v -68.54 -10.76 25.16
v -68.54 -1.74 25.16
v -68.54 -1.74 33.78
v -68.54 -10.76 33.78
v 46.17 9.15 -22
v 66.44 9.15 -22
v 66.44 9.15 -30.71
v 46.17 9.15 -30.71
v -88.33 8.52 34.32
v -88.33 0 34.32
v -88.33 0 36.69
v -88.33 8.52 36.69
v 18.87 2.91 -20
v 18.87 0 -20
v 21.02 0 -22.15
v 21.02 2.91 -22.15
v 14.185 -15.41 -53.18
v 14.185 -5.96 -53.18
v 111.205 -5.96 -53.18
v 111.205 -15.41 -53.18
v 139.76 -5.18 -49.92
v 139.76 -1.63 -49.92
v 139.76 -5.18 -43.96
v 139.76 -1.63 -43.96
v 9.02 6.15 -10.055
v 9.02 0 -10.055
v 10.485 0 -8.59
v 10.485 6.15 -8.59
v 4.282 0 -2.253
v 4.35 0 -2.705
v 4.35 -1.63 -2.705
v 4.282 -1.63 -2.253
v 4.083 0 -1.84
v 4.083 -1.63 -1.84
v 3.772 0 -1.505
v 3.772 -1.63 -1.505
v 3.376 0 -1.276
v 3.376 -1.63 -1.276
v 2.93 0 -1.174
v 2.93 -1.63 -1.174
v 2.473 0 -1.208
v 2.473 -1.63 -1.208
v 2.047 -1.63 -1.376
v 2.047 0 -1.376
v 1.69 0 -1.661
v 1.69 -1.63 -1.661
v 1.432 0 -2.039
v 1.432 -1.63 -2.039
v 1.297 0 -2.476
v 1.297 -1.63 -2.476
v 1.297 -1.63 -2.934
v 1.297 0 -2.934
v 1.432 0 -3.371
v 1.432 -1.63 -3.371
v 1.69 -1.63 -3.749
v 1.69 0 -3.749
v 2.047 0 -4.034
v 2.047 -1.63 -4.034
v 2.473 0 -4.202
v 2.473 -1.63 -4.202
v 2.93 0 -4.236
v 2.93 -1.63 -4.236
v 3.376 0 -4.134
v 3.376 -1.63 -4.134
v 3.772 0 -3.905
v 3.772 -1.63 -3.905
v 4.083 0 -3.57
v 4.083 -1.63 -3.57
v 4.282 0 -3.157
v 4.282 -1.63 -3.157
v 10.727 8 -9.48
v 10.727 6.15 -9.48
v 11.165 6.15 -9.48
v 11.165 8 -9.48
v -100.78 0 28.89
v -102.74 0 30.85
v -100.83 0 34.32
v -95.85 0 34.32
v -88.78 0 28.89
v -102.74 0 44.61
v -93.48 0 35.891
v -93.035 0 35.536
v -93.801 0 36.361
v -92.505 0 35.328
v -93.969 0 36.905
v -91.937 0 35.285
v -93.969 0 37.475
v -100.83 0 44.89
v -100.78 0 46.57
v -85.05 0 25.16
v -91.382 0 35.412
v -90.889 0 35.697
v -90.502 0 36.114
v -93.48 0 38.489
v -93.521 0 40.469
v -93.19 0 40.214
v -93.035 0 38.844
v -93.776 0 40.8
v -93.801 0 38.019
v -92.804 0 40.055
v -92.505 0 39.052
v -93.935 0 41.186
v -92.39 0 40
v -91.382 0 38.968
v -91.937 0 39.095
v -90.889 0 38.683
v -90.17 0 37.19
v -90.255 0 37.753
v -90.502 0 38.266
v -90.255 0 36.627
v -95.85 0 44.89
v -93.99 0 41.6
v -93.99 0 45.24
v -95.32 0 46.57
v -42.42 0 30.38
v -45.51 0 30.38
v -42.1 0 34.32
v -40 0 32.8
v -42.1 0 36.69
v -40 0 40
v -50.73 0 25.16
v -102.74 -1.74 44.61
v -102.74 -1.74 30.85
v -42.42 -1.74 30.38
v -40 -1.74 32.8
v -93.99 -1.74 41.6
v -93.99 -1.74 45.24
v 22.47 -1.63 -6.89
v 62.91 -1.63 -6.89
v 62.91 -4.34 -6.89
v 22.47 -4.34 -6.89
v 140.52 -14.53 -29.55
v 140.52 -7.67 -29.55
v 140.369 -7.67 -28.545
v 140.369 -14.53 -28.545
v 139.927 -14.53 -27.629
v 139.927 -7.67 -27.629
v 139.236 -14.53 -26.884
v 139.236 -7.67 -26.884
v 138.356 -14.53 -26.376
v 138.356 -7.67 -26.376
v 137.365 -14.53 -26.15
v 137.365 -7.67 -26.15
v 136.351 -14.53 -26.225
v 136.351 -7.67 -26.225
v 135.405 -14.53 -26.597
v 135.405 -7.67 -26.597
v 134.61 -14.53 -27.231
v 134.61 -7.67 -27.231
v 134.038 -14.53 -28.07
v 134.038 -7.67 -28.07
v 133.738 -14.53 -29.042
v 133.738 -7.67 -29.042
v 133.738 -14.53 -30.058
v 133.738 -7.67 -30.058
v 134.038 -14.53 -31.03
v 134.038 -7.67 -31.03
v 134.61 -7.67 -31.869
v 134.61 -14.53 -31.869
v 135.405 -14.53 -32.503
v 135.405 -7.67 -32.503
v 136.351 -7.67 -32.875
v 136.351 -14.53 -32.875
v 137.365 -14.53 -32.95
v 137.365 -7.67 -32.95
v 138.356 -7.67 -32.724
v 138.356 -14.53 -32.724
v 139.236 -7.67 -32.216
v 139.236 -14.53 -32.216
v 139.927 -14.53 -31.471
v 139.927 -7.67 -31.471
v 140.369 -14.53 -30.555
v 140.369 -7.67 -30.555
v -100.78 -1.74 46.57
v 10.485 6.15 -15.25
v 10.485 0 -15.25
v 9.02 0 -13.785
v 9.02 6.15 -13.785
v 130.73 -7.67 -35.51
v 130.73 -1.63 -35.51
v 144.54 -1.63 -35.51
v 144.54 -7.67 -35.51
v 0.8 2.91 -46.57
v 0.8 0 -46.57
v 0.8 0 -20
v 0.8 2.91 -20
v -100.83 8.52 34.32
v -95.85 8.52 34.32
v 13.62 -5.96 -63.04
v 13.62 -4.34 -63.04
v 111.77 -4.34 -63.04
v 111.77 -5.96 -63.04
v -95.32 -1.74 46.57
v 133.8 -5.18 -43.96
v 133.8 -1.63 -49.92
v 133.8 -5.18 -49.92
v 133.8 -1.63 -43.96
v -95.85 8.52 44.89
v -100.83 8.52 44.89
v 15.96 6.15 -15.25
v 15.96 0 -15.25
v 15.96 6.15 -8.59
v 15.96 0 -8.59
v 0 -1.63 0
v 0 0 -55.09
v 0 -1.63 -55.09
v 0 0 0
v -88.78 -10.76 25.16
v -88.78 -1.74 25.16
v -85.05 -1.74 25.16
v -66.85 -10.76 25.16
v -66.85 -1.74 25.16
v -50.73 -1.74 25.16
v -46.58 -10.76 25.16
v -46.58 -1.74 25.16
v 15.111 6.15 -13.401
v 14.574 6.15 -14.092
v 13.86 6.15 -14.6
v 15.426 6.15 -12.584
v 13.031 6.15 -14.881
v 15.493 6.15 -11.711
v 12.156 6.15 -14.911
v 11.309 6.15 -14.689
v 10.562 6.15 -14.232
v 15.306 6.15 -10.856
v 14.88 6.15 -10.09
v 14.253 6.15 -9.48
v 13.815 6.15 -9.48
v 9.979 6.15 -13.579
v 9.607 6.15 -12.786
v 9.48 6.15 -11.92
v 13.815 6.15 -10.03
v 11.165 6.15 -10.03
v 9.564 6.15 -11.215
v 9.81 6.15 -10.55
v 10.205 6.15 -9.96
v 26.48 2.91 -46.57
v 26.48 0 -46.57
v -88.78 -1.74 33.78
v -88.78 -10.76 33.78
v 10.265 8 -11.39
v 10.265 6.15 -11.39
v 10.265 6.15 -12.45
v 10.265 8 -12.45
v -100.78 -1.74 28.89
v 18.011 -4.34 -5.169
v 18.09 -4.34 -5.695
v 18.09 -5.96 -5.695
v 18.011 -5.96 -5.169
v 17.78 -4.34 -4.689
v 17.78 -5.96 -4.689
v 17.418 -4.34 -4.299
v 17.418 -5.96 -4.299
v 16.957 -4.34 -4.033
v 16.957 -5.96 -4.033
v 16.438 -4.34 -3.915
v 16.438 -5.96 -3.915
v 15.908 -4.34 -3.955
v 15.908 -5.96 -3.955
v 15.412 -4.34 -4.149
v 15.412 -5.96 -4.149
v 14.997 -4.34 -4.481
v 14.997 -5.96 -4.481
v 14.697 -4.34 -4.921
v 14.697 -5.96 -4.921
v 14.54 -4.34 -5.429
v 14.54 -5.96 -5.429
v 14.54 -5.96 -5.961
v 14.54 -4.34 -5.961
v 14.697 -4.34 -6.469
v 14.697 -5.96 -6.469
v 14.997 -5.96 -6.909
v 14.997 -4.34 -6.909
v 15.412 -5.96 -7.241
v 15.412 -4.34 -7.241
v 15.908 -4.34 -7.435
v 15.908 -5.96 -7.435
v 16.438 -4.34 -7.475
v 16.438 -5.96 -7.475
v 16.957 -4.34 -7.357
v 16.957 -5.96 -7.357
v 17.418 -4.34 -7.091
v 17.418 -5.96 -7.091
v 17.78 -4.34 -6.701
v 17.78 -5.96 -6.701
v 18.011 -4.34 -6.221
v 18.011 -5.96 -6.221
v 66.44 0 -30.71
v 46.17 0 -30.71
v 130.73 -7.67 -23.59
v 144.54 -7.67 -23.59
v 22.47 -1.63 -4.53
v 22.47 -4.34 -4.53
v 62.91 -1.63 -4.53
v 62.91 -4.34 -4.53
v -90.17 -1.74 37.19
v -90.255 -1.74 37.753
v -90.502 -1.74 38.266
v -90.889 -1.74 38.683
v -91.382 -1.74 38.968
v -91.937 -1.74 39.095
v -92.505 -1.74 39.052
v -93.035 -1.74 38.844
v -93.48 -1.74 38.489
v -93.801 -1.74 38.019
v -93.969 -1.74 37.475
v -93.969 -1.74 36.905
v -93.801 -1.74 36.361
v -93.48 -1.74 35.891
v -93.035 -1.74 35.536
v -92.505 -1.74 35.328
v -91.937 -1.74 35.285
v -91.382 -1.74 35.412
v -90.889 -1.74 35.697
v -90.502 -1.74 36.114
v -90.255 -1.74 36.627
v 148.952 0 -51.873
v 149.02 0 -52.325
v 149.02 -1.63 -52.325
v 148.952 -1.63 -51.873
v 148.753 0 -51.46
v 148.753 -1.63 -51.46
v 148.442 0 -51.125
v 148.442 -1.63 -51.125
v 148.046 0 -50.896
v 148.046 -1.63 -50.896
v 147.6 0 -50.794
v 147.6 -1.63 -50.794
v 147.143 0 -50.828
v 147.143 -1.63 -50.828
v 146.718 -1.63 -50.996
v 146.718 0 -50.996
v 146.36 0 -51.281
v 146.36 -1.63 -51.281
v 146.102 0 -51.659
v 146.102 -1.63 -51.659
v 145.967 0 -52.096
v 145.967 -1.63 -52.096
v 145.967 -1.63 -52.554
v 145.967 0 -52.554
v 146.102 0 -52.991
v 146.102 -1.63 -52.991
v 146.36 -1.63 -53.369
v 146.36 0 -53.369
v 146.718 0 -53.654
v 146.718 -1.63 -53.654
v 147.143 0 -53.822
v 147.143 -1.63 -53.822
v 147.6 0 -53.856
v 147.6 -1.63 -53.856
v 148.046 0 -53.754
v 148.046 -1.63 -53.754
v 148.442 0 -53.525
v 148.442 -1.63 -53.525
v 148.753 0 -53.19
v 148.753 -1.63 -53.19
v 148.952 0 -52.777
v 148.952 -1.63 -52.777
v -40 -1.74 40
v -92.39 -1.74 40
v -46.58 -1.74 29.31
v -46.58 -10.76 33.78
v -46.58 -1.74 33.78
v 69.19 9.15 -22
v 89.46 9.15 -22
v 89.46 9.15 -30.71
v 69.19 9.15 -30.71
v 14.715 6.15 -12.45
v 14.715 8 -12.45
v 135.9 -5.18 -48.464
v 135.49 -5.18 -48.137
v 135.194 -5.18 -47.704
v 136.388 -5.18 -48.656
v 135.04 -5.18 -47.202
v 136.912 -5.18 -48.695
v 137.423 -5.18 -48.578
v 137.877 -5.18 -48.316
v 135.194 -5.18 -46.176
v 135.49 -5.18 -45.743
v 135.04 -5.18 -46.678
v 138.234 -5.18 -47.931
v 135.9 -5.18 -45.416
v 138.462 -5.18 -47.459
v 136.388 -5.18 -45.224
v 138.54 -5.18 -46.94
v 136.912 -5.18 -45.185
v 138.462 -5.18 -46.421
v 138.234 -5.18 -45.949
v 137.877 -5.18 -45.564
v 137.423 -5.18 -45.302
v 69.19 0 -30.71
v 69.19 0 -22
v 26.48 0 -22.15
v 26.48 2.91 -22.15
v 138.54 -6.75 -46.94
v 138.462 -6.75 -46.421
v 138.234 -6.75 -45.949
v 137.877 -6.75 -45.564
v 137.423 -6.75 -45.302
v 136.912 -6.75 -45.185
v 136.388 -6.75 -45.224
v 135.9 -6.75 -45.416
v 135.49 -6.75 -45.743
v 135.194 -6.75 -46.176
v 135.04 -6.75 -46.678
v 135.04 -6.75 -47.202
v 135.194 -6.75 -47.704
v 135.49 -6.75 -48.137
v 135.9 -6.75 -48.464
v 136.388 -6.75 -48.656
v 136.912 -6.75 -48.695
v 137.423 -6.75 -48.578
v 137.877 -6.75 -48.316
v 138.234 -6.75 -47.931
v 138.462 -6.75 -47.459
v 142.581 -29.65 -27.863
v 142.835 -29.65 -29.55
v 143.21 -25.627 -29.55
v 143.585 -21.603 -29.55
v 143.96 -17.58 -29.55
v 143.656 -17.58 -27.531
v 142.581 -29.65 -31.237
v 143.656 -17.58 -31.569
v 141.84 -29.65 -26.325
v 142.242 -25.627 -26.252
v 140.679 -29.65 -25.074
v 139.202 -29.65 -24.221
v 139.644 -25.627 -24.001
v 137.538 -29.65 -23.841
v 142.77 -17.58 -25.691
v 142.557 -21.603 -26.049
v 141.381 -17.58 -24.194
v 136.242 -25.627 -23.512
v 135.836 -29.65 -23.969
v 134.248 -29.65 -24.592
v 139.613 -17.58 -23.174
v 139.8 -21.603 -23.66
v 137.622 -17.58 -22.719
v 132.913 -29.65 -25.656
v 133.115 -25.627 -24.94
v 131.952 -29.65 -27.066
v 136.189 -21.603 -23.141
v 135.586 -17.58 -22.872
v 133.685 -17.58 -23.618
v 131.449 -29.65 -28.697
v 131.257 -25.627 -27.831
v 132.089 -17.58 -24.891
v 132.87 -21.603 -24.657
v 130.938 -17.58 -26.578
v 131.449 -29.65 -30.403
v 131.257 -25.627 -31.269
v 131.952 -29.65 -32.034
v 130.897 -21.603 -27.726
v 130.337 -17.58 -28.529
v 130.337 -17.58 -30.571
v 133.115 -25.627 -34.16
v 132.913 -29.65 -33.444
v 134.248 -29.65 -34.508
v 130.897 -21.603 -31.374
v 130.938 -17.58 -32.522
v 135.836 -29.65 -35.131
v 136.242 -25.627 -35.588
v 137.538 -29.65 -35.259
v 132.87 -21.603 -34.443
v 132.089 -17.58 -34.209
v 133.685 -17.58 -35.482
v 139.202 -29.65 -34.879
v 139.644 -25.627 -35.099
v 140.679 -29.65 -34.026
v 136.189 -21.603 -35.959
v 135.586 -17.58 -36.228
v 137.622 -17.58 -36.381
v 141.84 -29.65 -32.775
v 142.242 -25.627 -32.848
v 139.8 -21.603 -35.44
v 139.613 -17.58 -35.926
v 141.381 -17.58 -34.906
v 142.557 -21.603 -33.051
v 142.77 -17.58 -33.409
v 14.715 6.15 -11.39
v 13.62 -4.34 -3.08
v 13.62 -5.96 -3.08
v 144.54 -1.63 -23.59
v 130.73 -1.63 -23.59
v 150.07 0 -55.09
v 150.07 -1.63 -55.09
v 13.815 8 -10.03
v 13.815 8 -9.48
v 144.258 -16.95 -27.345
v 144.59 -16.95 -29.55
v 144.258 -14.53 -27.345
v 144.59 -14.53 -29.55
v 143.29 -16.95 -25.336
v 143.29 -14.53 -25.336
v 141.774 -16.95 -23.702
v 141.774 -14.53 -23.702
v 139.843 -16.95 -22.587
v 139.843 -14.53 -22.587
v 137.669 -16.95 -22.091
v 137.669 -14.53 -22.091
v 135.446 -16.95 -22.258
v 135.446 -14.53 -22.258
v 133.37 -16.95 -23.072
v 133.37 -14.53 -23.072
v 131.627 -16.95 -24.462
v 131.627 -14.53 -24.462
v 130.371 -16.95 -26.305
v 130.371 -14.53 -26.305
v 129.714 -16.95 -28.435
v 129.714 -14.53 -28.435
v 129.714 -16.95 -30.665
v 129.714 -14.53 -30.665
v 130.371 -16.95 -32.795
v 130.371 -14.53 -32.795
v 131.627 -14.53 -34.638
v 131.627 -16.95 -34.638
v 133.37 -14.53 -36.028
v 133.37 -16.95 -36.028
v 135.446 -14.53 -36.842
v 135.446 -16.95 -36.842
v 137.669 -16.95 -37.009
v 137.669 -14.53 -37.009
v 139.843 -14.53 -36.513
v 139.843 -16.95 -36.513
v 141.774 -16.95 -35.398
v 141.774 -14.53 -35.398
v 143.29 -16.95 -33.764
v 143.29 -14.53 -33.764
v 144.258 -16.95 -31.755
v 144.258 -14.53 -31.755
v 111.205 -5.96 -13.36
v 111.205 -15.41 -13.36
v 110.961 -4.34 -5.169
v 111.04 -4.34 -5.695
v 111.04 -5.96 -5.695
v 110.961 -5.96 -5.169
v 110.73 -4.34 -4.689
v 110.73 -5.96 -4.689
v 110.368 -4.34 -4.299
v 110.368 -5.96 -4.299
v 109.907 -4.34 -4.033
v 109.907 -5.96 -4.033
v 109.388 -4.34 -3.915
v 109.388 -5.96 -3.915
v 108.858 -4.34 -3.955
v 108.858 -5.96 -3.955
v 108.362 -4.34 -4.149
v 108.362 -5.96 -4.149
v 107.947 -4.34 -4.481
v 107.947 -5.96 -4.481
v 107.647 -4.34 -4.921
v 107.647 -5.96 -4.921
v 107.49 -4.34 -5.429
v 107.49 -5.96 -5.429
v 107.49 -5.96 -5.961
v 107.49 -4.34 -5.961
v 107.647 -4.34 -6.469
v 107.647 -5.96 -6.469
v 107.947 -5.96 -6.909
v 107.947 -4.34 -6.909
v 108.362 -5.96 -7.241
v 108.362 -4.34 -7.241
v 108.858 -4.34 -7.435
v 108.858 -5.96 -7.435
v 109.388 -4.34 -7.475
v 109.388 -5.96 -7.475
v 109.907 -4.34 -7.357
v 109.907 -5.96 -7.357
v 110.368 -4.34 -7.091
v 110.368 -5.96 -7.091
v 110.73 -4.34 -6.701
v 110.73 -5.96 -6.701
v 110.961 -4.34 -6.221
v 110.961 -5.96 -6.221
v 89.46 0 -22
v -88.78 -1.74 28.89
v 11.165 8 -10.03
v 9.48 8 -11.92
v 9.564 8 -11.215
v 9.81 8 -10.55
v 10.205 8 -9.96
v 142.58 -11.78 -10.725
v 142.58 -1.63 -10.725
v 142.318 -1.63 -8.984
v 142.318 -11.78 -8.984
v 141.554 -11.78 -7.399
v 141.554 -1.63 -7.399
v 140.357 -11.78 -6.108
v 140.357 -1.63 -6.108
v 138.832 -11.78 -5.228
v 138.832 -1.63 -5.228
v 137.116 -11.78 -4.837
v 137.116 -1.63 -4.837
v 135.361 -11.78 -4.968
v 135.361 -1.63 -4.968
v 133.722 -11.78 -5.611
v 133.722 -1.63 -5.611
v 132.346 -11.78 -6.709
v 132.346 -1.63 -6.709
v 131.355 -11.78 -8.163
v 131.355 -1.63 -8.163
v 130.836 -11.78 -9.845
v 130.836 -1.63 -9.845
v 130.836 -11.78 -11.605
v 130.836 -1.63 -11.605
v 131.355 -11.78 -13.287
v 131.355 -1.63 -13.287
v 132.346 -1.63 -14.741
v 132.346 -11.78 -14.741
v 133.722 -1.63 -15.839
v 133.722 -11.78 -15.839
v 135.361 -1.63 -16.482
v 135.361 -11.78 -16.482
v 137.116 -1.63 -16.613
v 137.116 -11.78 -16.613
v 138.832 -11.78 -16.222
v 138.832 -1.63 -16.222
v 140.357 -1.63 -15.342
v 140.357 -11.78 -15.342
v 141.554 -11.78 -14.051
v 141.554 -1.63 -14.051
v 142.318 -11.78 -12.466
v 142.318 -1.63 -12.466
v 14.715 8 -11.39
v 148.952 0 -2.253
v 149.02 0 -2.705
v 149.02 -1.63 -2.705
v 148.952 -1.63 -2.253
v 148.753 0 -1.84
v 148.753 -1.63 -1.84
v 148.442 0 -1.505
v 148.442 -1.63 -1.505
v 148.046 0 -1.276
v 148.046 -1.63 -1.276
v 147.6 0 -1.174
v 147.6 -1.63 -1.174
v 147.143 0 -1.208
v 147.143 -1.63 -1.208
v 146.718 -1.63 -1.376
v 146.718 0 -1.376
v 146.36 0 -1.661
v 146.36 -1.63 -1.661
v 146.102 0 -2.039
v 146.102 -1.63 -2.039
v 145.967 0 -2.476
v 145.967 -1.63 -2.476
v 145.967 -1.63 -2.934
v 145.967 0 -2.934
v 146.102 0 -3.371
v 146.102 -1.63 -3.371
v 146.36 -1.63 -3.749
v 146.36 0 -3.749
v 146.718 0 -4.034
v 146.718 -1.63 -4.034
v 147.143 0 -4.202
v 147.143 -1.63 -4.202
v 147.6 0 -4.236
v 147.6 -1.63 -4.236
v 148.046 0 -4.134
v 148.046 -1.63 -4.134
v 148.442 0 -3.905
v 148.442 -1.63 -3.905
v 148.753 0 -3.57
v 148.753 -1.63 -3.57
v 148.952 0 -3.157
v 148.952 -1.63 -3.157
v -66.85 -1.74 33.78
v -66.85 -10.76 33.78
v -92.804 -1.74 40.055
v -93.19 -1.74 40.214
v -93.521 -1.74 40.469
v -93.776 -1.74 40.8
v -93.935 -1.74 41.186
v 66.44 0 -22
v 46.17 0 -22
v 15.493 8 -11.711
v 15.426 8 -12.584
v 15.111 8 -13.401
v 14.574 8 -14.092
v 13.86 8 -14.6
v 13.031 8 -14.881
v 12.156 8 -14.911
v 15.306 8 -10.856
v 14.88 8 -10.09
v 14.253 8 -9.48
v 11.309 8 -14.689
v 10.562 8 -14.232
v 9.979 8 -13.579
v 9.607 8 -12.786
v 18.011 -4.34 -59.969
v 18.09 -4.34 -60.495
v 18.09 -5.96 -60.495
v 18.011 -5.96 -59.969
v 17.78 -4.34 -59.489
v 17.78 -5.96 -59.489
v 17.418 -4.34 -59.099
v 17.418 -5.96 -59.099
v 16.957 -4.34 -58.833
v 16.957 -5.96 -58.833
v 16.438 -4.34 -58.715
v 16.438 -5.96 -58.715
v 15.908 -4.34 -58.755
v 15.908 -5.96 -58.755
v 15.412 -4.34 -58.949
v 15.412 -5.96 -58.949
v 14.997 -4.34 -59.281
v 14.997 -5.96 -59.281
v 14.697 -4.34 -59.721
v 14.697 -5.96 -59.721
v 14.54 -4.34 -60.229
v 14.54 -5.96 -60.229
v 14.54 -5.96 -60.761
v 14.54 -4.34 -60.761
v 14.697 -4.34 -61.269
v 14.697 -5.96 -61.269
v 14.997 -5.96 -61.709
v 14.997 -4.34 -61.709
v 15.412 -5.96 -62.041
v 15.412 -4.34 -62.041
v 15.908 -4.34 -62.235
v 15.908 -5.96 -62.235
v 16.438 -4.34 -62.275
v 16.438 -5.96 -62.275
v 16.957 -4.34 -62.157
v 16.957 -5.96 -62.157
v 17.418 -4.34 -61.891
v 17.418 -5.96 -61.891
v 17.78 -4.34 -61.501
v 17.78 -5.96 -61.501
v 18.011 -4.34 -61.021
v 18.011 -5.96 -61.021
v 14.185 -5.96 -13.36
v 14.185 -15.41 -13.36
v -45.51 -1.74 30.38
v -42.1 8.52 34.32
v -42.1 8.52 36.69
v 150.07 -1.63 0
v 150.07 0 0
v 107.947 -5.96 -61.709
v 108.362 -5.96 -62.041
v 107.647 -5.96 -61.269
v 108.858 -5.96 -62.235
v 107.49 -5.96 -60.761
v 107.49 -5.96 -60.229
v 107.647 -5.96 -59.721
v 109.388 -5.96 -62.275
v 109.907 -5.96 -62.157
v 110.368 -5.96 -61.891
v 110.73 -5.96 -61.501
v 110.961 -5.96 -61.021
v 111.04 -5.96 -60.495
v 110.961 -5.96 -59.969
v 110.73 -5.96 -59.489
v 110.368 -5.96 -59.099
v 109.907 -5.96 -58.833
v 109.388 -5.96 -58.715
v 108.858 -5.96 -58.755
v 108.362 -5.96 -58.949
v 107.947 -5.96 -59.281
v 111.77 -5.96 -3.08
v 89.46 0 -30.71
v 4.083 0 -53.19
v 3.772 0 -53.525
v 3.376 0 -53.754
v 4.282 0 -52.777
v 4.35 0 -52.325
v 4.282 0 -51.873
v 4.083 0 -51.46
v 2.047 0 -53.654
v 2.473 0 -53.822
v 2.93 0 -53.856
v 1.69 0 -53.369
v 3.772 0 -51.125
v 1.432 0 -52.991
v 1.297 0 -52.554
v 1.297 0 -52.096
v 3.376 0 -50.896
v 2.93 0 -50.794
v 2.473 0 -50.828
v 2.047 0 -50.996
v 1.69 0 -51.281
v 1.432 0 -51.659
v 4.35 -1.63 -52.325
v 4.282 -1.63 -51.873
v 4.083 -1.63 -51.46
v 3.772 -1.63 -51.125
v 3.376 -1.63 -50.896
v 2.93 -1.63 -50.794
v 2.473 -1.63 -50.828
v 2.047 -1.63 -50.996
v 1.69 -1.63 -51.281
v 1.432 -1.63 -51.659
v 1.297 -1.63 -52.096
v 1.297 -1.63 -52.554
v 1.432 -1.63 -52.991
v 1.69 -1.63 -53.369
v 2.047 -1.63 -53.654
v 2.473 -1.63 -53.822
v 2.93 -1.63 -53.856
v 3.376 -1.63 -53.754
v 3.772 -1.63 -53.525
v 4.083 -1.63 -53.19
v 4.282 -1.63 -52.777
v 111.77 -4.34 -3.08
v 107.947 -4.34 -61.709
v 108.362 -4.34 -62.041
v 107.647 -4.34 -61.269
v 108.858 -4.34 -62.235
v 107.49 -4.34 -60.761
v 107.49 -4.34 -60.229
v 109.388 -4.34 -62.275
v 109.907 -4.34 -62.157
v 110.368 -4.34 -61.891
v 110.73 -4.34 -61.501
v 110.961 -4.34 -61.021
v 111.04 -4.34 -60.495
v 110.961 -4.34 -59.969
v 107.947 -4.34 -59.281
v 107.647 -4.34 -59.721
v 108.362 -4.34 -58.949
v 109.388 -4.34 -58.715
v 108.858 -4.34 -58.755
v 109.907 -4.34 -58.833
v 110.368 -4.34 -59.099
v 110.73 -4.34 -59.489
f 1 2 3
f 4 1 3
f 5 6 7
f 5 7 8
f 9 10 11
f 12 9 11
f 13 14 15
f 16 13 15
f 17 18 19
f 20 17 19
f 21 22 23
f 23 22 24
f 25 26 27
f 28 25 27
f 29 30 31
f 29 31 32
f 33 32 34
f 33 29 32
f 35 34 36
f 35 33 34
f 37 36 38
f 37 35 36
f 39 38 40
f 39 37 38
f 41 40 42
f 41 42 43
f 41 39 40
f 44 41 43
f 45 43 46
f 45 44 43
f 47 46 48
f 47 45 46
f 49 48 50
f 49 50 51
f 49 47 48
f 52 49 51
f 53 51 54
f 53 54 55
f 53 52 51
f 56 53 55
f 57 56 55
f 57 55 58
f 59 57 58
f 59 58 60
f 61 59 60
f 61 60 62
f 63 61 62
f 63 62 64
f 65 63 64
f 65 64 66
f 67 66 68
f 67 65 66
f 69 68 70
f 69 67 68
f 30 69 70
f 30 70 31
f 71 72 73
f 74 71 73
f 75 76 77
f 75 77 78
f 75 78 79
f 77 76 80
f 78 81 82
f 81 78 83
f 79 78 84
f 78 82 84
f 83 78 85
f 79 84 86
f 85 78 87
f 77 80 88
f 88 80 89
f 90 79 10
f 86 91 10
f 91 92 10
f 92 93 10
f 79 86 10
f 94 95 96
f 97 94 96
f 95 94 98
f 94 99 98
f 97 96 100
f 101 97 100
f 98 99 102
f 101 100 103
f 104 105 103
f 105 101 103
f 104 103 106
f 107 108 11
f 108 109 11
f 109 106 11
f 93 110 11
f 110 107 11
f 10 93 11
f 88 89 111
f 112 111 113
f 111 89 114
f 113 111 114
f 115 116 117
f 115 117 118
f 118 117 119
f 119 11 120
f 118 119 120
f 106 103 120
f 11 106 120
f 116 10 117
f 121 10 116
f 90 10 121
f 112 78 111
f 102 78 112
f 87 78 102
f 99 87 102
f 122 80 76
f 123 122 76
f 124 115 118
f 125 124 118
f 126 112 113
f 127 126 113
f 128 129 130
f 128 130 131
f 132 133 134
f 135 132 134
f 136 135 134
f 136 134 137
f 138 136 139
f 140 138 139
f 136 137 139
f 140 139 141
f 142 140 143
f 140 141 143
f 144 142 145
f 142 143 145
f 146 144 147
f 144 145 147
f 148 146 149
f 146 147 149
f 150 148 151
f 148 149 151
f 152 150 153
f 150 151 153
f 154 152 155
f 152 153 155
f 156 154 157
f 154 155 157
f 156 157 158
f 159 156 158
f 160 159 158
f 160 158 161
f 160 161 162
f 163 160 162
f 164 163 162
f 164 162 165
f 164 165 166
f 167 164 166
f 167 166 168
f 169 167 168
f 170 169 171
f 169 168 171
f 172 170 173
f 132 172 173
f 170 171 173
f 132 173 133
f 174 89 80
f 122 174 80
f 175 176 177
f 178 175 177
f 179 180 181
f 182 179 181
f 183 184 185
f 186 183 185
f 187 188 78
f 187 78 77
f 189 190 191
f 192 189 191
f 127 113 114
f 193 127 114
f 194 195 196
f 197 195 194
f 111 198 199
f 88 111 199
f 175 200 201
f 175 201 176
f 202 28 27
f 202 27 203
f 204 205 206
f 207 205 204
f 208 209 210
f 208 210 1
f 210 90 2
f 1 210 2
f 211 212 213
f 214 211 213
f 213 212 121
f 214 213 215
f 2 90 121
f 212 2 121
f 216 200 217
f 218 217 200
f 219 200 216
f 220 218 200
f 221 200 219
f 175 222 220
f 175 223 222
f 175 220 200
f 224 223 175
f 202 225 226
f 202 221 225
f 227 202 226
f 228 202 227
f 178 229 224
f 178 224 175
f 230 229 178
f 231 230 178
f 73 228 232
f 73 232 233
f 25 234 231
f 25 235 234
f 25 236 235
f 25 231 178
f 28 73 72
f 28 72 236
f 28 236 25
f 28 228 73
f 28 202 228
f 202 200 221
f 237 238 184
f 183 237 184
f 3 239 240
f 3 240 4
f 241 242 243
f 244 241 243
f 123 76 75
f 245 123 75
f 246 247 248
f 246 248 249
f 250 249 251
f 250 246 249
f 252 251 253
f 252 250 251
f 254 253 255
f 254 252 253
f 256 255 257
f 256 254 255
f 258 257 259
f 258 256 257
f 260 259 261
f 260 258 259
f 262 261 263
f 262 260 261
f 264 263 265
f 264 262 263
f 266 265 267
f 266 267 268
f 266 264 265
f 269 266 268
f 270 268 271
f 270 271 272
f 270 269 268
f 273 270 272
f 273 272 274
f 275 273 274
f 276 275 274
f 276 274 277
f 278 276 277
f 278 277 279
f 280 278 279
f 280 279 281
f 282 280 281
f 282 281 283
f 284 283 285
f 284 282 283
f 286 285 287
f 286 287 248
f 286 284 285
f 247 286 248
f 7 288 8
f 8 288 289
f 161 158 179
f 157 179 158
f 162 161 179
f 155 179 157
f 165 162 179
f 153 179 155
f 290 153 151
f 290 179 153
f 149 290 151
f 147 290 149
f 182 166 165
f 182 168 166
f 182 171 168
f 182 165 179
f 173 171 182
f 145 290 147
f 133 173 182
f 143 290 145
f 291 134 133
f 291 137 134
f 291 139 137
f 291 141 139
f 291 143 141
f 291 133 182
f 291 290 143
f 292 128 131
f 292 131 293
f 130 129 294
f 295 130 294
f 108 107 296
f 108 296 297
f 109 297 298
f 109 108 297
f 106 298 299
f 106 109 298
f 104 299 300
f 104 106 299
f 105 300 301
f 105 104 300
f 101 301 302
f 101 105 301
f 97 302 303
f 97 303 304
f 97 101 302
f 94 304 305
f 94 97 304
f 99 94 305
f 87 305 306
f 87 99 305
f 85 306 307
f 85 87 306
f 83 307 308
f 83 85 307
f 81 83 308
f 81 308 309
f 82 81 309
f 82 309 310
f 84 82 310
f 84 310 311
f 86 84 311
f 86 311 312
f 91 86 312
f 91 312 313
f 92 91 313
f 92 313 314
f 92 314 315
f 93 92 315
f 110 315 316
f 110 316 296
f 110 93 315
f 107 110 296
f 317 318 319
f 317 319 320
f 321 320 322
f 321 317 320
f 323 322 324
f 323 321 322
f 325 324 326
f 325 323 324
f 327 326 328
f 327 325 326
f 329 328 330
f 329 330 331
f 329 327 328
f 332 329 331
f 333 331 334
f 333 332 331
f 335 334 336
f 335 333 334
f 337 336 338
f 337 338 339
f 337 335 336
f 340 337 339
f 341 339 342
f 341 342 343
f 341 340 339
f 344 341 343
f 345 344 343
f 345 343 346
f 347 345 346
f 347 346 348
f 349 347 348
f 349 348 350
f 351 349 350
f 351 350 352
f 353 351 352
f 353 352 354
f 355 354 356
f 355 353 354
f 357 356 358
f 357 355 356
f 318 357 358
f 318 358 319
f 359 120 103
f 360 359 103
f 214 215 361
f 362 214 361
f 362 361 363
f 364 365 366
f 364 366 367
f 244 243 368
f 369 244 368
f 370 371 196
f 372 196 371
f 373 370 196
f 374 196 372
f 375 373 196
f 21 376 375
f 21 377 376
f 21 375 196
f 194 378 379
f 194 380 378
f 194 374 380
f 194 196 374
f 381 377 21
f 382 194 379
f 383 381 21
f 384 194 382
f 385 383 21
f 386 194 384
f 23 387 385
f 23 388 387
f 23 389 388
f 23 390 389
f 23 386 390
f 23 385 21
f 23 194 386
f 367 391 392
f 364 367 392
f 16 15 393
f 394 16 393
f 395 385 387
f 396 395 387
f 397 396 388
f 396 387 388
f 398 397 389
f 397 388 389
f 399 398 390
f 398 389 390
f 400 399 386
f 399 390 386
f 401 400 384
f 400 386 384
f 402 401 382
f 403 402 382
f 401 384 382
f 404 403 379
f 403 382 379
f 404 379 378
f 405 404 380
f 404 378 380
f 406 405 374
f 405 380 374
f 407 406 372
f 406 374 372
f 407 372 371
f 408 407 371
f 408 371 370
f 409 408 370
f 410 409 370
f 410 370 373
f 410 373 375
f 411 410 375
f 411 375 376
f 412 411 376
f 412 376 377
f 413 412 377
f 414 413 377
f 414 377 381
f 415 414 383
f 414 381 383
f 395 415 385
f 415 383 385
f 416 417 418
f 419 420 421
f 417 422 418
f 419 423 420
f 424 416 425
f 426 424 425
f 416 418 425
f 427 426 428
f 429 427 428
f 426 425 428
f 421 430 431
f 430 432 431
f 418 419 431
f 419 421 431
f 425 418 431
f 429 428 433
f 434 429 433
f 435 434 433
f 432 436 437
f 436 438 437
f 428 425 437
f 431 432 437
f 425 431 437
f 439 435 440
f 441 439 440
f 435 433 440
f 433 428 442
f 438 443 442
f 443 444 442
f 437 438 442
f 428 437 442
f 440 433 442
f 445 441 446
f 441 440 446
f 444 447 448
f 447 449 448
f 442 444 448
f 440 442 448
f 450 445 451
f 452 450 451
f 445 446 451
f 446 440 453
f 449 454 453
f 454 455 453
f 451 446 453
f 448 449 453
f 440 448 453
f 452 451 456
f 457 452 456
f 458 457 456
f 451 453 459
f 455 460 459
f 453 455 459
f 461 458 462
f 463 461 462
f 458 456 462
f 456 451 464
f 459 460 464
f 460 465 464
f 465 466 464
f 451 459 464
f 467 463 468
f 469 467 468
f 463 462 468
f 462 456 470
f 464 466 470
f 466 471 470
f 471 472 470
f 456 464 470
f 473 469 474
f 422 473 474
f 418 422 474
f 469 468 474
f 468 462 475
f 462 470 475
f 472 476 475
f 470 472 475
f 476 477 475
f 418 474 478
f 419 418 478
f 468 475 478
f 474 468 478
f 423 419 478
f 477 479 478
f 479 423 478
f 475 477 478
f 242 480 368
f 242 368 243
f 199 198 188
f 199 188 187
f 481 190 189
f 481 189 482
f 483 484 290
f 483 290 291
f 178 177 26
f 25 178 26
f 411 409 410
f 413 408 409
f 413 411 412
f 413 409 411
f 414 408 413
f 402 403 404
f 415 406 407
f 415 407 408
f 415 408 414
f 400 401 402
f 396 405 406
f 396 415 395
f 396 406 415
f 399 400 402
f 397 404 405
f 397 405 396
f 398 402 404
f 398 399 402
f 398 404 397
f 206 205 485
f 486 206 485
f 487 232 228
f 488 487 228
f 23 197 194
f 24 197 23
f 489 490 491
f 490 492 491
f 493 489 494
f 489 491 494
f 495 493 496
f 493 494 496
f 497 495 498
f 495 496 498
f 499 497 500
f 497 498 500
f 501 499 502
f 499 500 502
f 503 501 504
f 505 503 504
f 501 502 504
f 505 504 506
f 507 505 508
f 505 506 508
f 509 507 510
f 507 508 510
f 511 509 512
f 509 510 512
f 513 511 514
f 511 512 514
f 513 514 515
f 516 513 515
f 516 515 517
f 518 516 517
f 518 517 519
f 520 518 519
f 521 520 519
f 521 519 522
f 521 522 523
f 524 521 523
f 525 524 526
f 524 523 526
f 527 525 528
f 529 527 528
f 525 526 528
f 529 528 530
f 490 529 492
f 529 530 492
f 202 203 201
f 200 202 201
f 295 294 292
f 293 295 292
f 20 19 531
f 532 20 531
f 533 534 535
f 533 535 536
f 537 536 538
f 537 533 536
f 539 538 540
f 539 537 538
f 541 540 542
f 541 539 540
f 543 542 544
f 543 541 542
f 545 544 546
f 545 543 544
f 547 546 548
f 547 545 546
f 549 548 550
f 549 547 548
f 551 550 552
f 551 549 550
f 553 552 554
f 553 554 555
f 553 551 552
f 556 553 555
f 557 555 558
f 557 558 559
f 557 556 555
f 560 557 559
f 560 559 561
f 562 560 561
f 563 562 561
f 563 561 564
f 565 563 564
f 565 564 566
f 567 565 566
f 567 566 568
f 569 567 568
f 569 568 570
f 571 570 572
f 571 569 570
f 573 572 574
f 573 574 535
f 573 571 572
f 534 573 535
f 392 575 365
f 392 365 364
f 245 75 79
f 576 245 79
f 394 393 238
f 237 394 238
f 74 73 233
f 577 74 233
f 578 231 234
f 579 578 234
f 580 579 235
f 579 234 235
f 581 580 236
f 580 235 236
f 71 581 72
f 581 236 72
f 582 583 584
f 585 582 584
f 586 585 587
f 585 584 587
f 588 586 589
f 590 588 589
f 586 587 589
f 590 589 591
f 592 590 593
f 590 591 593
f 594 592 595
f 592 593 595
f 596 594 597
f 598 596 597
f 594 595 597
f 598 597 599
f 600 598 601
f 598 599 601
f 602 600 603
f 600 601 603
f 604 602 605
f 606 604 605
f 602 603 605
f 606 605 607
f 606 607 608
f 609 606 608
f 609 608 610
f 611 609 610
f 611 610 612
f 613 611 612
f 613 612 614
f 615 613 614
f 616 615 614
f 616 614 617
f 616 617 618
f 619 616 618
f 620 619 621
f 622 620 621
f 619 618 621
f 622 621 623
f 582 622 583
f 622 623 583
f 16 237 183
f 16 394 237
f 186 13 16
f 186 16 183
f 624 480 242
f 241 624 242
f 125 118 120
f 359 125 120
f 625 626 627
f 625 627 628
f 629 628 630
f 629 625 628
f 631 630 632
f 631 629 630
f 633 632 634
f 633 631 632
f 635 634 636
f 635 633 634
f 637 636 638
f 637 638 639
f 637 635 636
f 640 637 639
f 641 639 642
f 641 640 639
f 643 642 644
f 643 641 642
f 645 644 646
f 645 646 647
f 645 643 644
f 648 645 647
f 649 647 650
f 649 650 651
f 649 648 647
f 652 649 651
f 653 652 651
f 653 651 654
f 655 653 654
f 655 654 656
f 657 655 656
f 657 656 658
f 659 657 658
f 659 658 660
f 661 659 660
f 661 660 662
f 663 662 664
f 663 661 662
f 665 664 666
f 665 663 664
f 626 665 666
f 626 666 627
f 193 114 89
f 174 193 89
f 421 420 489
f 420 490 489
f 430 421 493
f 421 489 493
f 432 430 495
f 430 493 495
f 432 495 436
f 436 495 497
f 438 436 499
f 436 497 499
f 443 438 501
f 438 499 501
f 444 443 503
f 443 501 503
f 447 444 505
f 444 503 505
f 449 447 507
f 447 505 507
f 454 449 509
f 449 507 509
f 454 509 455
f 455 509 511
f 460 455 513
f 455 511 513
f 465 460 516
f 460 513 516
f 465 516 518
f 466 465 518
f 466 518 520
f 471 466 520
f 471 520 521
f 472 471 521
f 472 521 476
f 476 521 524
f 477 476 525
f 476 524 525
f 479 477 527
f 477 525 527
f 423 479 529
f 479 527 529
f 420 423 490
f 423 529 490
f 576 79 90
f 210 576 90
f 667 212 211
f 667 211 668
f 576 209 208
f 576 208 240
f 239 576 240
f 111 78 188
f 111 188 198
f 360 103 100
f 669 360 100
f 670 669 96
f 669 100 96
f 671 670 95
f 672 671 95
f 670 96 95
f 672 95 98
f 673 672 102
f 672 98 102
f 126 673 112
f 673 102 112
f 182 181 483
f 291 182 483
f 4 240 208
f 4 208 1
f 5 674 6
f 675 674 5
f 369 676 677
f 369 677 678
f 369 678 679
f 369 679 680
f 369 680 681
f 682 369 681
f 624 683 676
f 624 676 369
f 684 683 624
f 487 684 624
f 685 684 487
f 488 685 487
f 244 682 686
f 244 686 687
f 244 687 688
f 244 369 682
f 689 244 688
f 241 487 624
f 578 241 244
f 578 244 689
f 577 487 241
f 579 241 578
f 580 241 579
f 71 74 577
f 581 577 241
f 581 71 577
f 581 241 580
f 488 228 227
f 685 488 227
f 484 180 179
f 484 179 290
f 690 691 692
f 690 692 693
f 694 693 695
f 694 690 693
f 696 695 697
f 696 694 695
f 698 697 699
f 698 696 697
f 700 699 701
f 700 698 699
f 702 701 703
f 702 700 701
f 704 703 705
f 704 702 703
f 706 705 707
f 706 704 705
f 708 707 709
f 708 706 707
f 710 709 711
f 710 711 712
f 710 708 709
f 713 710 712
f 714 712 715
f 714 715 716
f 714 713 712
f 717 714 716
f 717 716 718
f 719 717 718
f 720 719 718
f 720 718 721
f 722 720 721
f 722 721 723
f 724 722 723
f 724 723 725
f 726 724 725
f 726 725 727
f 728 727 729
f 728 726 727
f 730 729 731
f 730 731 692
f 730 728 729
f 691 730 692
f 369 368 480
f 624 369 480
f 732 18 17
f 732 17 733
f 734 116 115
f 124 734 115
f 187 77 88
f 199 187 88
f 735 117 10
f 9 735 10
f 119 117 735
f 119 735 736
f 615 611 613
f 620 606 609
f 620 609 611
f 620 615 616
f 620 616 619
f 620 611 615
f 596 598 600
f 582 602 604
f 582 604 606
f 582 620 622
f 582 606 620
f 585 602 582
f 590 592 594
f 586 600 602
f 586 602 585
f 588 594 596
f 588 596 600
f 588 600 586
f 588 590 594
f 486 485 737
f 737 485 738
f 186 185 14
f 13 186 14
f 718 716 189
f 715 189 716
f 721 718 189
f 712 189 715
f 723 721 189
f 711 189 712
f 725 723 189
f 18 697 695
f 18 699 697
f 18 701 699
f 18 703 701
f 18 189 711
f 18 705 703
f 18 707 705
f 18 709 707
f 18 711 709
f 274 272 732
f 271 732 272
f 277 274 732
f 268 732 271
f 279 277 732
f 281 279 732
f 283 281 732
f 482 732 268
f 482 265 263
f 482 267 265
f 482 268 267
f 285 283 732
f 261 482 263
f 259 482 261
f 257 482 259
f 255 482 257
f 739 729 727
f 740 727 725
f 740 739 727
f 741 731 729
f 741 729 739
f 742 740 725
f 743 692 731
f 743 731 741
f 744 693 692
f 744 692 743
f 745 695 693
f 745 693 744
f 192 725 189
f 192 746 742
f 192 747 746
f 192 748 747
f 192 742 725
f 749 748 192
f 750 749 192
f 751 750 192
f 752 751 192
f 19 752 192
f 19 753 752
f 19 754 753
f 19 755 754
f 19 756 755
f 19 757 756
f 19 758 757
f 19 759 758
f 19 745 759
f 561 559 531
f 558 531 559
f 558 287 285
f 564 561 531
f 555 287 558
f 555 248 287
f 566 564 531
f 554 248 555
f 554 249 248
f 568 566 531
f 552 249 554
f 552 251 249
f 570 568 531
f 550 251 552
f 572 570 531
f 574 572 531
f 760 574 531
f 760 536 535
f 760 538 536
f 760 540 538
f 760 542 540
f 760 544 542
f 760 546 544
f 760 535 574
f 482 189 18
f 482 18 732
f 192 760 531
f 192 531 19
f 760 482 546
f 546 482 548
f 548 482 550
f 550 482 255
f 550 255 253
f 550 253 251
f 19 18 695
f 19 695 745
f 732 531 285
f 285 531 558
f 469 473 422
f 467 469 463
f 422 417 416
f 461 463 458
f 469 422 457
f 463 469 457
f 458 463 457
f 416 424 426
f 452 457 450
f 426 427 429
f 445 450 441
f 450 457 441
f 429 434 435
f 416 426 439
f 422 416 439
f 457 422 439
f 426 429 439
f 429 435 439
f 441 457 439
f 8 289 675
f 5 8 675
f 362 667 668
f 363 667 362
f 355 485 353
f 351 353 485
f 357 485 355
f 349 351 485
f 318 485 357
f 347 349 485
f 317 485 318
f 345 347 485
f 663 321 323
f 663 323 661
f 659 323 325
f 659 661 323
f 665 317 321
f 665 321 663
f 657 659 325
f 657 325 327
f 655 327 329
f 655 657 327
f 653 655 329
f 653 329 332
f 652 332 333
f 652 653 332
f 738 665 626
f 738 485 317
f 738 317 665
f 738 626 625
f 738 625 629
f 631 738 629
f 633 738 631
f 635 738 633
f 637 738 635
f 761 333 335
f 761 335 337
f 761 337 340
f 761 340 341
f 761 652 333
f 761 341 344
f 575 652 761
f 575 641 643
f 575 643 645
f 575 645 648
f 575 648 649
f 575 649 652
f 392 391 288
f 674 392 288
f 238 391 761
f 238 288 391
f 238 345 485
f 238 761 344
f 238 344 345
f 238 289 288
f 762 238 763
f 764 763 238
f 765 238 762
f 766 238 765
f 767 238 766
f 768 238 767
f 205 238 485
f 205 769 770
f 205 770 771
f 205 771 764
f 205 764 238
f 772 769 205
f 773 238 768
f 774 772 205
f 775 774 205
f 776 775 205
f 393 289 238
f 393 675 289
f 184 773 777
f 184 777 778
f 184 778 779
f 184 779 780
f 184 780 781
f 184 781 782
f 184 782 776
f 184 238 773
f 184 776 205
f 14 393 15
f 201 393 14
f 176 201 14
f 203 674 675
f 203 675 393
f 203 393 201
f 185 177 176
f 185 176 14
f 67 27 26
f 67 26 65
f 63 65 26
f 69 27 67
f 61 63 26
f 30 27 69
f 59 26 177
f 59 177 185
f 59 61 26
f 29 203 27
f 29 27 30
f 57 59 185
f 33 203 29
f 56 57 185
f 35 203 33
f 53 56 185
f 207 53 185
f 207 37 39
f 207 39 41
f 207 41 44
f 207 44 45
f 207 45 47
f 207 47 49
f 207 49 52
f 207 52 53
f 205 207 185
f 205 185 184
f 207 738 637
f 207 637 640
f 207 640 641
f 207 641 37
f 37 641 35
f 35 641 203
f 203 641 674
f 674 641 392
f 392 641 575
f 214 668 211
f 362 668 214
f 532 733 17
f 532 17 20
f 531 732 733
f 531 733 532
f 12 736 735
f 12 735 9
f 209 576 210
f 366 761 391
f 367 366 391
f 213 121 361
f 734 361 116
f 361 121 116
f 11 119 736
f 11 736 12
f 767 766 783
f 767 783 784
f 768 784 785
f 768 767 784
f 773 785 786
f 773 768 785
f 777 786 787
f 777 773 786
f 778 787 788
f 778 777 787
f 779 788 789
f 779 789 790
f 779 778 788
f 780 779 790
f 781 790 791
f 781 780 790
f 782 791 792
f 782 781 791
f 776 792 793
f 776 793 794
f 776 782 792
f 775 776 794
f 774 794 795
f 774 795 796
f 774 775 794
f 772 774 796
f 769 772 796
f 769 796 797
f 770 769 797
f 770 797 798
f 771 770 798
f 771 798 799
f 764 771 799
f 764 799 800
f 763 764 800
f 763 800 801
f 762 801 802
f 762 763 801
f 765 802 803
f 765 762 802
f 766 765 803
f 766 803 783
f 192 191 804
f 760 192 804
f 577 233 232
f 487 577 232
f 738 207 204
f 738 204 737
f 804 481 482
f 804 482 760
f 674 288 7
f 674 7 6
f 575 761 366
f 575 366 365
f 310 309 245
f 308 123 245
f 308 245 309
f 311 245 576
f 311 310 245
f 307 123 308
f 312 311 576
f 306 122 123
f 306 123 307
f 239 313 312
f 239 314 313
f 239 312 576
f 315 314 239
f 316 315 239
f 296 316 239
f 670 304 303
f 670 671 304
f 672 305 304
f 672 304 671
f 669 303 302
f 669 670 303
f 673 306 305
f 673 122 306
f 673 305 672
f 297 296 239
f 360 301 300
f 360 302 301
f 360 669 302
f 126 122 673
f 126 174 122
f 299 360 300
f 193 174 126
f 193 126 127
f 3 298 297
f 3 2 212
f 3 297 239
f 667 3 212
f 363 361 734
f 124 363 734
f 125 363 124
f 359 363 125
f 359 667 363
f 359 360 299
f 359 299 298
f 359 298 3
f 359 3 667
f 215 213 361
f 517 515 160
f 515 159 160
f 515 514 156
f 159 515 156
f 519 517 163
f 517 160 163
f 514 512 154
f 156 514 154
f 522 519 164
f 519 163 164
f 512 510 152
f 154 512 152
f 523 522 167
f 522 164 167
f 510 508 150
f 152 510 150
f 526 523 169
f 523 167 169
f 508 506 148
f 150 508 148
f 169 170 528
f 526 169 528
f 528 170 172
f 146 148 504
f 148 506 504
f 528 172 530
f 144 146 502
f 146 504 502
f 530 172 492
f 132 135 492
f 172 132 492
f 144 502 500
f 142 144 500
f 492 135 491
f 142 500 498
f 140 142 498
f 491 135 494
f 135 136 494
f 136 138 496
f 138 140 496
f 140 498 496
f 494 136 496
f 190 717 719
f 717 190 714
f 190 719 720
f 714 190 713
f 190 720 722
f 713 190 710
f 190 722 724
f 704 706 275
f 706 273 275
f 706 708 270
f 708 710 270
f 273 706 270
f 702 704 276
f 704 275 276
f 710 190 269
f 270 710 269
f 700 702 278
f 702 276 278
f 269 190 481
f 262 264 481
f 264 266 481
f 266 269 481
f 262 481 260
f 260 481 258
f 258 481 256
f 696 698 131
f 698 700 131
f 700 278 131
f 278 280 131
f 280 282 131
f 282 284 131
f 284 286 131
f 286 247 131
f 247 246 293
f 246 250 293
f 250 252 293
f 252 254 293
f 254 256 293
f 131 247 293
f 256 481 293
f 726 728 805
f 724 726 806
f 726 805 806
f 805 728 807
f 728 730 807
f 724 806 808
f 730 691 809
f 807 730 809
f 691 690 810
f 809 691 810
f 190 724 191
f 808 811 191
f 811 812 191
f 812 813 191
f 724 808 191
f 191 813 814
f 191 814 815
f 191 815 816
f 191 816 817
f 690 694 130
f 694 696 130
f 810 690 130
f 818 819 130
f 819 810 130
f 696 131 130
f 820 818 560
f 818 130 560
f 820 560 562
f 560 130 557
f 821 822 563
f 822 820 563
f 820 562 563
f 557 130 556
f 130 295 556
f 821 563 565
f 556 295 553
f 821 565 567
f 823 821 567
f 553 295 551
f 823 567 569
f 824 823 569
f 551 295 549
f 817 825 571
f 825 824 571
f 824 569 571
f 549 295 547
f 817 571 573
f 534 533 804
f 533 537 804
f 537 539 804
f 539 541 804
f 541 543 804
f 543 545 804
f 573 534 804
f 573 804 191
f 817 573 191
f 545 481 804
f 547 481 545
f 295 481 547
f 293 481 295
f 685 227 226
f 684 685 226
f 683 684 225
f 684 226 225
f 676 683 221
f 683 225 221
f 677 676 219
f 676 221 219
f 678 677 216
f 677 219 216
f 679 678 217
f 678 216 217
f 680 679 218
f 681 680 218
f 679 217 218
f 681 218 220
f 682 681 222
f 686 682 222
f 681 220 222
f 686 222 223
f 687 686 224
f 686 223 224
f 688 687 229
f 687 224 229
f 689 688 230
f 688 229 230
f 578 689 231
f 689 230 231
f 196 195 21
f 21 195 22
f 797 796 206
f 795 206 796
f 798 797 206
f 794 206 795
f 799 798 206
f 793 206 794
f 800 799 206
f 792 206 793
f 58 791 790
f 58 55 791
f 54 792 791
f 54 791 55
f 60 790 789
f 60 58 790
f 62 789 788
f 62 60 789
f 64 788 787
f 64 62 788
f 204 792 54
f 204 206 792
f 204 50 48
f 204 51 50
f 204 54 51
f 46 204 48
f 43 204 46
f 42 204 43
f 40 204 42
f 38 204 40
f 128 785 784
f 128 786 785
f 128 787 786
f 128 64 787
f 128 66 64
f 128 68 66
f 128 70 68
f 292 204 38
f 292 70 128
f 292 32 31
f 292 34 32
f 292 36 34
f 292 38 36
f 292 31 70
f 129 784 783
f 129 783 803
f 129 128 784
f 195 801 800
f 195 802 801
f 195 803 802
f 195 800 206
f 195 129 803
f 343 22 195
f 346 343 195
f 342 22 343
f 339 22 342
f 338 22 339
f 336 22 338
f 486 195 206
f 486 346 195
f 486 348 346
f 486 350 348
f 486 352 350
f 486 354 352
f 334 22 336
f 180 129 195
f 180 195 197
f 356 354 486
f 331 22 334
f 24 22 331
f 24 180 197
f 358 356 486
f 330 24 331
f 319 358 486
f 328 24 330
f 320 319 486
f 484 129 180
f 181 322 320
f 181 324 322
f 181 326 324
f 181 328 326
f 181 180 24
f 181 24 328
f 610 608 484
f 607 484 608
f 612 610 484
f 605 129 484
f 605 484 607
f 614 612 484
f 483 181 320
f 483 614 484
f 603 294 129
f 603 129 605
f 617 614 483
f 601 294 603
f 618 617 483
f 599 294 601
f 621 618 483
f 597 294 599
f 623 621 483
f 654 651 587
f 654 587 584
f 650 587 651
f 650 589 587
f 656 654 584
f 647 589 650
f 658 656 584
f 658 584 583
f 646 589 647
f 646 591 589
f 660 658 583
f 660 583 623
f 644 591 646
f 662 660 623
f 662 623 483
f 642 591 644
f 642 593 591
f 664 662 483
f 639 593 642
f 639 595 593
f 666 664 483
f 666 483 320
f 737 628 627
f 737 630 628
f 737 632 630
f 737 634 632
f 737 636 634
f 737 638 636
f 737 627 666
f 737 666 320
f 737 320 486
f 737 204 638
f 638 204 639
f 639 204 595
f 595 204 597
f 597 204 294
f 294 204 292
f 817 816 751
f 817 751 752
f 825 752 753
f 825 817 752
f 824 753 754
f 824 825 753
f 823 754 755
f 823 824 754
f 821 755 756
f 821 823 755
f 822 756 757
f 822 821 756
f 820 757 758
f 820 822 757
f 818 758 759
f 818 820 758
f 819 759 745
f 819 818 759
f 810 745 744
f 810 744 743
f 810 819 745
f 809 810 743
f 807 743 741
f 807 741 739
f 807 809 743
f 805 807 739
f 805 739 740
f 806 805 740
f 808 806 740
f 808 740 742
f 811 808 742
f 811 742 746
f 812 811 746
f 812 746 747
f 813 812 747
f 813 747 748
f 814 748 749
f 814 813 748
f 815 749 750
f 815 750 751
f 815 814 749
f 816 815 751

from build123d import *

# Parameters (mm, degrees)
F0_W      = 150.07
F0_H      = 55.09
F0_R      = 1.535
F1_DEPTH  = 1.63
F3_W      = 98.15
F3_H      = 59.96
F3_R      = 1.785
F4_DEPTH  = 1.62
F5_W      = 97.02
F5_H      = 39.82
F6_DEPTH  = 9.45
F7_W      = 5.96
F7_H      = 5.96
F8_DEPTH  = 3.55
F9_R      = 1.76
F10_DEPTH = 1.57
F11_W     = 13.81
F11_H     = 11.92
F12_DEPTH = 6.04
F13_R     = 3.41
F14_DEPTH = 6.86
F19_R     = 5.905
F20_DEPTH = 10.15
F22_DEPTH = 2.91
F24_DEPTH = 6.15
F26_DEPTH = 1.85
F27_W     = 20.27
F27_H     = 8.71
F28_DEPTH = 9.15
F29_R     = 1.91
F30_DEPTH = 1.74
F31_W     = 20.24
F31_H     = 8.62
F31_W_2   = 20.27
F32_DEPTH = 9.02
F33_W     = 4.98
F33_H     = 10.57
F33_W_2   = 46.23
F33_H_2   = 2.37
F34_DEPTH = 8.52
F35_W     = 40.44
F35_H     = 2.36
F36_DEPTH = 4.34


with BuildPart() as f1:
    # F0 (on Front) → F1 (new body)
    with BuildSketch(Plane.XZ):
        with Locations((75.035, -27.545)):
            Rectangle(F0_W, F0_H)
        with Locations((2.815, -52.325)):
            Circle(F0_R, mode=Mode.SUBTRACT)
        with Locations((147.485, -52.325)):
            Circle(F0_R, mode=Mode.SUBTRACT)
        with Locations((2.815, -2.705)):
            Circle(F0_R, mode=Mode.SUBTRACT)
        with Locations((147.485, -2.705)):
            Circle(F0_R, mode=Mode.SUBTRACT)
    extrude(amount=F1_DEPTH)

    # F7 (on face) → F8 (join)
    with BuildSketch(Plane.XZ.offset(1.63)):
        with Locations((136.78, -46.94)):
            Rectangle(F7_W, F7_H)
    extrude(amount=F8_DEPTH)

    # F9 (on face) → F10 (join)
    with BuildSketch(Plane.XZ.offset(5.18)):
        with Locations((136.78, -46.94)):
            Circle(F9_R)
    extrude(amount=F10_DEPTH)

    # F11 (on face) → F12 (join)
    with BuildSketch(Plane.XZ.offset(1.63)):
        with Locations((137.635, -29.55)):
            Rectangle(F11_W, F11_H)
    extrude(amount=F12_DEPTH)

    # F13 (on face) → F14 (join)
    with BuildSketch(Plane.XZ.offset(7.67)):
        with Locations((137.11, -29.55)):
            Circle(F13_R)
    extrude(amount=F14_DEPTH)

    # F17 (on plane+point) → F18 (revolve)
    with BuildSketch(Plane.XY.offset(-29.55)):
        Polygon((144.59, -14.53), (137.11, -14.53), (137.11, -29.65), (142.835, -29.65), (143.96, -17.58), (144.59, -16.95), align=None)
    revolve(axis=Axis((137.11, -22.09, -29.55), (0, -1, 0)))

    # F19 (on face) → F20 (join)
    with BuildSketch(Plane.XZ.offset(1.63)):
        with Locations((136.675, -10.725)):
            Circle(F19_R)
    extrude(amount=F20_DEPTH)

    # F21 (on face) → F22 (join)
    with BuildSketch(Plane(origin=(0, 0, 0), x_dir=(-1, 0, 0), z_dir=(0, 1, 0))):
        Polygon((-26.48, -46.57), (-0.8, -46.57), (-0.8, -20), (-18.87, -20), (-21.02, -22.15), (-26.48, -22.15), align=None)
    extrude(amount=F22_DEPTH)

    # F23 (on face) → F24 (join)
    with BuildSketch(Plane(origin=(0, 0, 0), x_dir=(-1, 0, 0), z_dir=(0, 1, 0))):
        Polygon((-9.02, -13.785), (-9.02, -11.92), (-9.02, -10.055), (-10.485, -8.59), (-15.96, -8.59), (-15.96, -11.92), (-15.96, -15.25), (-10.485, -15.25), align=None)
    extrude(amount=F24_DEPTH)

    # F25 (on face) → F26 (join)
    with BuildSketch(Plane(origin=(0, 6.15, 0), x_dir=(-1, 0, 0), z_dir=(0, 1, 0))):
        with BuildLine():
            ThreePointArc((-14.2525265955, -9.48), (-13.8601997934, -14.6000471127), (-9.48, -11.92))
            ThreePointArc((-9.48, -11.92), (-9.8099528873, -10.5498002066), (-10.7274734045, -9.48))
            Line((-10.7274734045, -9.48), (-11.165, -9.48))
            Line((-11.165, -9.48), (-11.165, -10.03))
            Line((-11.165, -10.03), (-12.49, -10.03))
            Line((-12.49, -10.03), (-13.815, -10.03))
            Line((-13.815, -10.03), (-13.815, -9.48))
            Line((-13.815, -9.48), (-14.2525265955, -9.48))
        make_face()
        Polygon((-14.715, -11.92), (-14.715, -11.39), (-12.49, -11.39), (-10.265, -11.39), (-10.265, -11.92), (-10.265, -12.45), (-12.49, -12.45), (-14.715, -12.45), align=None, mode=Mode.SUBTRACT)
    extrude(amount=F26_DEPTH)

    # F27 (on face) → F28 (join)
    with BuildSketch(Plane(origin=(0, 0, 0), x_dir=(-1, 0, 0), z_dir=(0, 1, 0))):
        with Locations((-56.305, -26.355)):
            Rectangle(F27_W, F27_H)
        with Locations((-79.325, -26.355)):
            Rectangle(F27_W, F27_H)
    extrude(amount=F28_DEPTH)



with BuildPart() as f4:
    # F3 (on offset) → F4 (new body)
    with BuildSketch(Plane.XZ.offset(4.34)):
        with Locations((62.695, -33.06)):
            Rectangle(F3_W, F3_H)
        with Locations((16.305, -60.495)):
            Circle(F3_R, mode=Mode.SUBTRACT)
        with Locations((109.255, -60.495)):
            Circle(F3_R, mode=Mode.SUBTRACT)
        with Locations((16.305, -5.695)):
            Circle(F3_R, mode=Mode.SUBTRACT)
        with Locations((109.255, -5.695)):
            Circle(F3_R, mode=Mode.SUBTRACT)
    extrude(amount=F4_DEPTH)

    # F5 (on face) → F6 (join)
    with BuildSketch(Plane.XZ.offset(5.96)):
        with Locations((62.695, -33.27)):
            Rectangle(F5_W, F5_H)
    extrude(amount=F6_DEPTH)


with BuildPart() as f30:
    # F29 (on Front) → F30 (new body)
    with BuildSketch(Plane.XZ):
        with BuildLine():
            Line((-40, 32.8), (-40, 40))
            Line((-40, 40), (-92.39, 40))
            ThreePointArc((-92.39, 40), (-93.5213708499, 40.4686291501), (-93.99, 41.6))
            Line((-93.99, 41.6), (-93.99, 45.24))
            Line((-93.99, 45.24), (-95.32, 46.57))
            Line((-95.32, 46.57), (-100.78, 46.57))
            Line((-100.78, 46.57), (-102.74, 44.61))
            Line((-102.74, 44.61), (-102.74, 30.85))
            Line((-102.74, 30.85), (-100.78, 28.89))
            Line((-100.78, 28.89), (-88.78, 28.89))
            Line((-88.78, 28.89), (-85.05, 25.16))
            Line((-85.05, 25.16), (-50.73, 25.16))
            Line((-50.73, 25.16), (-45.51, 30.38))
            Line((-45.51, 30.38), (-42.42, 30.38))
            Line((-42.42, 30.38), (-40, 32.8))
        make_face()
        with Locations((-92.08, 37.19)):
            Circle(F29_R, mode=Mode.SUBTRACT)
    extrude(amount=F30_DEPTH)

    # F31 (on face) → F32 (join)
    with BuildSketch(Plane.XZ.offset(1.74)):
        with Locations((-78.66, 29.47)):
            Rectangle(F31_W, F31_H)
        with Locations((-56.715, 29.47)):
            Rectangle(F31_W_2, F31_H)
    extrude(amount=F32_DEPTH)

    # F33 (on face) → F34 (join)
    with BuildSketch(Plane(origin=(0, 0, 0), x_dir=(-1, 0, 0), z_dir=(0, 1, 0))):
        with Locations((98.34, 39.605)):
            Rectangle(F33_W, F33_H)
        with Locations((65.215, 35.505)):
            Rectangle(F33_W_2, F33_H_2)
    extrude(amount=F34_DEPTH)


with BuildPart() as f1_1:
    add(f1.part)

    add(f4.part)  # F36 merges F4
    # F35 (on face) → F36 (join, through all)
    with BuildSketch(Plane(origin=(0, 0, 0), x_dir=(-1, 0, 0), z_dir=(0, 1, 0))):
        with Locations((-42.69, -5.71)):
            Rectangle(F35_W, F35_H)
    extrude(amount=-F36_DEPTH)


solid = Compound([f30.part, f1_1.part])
